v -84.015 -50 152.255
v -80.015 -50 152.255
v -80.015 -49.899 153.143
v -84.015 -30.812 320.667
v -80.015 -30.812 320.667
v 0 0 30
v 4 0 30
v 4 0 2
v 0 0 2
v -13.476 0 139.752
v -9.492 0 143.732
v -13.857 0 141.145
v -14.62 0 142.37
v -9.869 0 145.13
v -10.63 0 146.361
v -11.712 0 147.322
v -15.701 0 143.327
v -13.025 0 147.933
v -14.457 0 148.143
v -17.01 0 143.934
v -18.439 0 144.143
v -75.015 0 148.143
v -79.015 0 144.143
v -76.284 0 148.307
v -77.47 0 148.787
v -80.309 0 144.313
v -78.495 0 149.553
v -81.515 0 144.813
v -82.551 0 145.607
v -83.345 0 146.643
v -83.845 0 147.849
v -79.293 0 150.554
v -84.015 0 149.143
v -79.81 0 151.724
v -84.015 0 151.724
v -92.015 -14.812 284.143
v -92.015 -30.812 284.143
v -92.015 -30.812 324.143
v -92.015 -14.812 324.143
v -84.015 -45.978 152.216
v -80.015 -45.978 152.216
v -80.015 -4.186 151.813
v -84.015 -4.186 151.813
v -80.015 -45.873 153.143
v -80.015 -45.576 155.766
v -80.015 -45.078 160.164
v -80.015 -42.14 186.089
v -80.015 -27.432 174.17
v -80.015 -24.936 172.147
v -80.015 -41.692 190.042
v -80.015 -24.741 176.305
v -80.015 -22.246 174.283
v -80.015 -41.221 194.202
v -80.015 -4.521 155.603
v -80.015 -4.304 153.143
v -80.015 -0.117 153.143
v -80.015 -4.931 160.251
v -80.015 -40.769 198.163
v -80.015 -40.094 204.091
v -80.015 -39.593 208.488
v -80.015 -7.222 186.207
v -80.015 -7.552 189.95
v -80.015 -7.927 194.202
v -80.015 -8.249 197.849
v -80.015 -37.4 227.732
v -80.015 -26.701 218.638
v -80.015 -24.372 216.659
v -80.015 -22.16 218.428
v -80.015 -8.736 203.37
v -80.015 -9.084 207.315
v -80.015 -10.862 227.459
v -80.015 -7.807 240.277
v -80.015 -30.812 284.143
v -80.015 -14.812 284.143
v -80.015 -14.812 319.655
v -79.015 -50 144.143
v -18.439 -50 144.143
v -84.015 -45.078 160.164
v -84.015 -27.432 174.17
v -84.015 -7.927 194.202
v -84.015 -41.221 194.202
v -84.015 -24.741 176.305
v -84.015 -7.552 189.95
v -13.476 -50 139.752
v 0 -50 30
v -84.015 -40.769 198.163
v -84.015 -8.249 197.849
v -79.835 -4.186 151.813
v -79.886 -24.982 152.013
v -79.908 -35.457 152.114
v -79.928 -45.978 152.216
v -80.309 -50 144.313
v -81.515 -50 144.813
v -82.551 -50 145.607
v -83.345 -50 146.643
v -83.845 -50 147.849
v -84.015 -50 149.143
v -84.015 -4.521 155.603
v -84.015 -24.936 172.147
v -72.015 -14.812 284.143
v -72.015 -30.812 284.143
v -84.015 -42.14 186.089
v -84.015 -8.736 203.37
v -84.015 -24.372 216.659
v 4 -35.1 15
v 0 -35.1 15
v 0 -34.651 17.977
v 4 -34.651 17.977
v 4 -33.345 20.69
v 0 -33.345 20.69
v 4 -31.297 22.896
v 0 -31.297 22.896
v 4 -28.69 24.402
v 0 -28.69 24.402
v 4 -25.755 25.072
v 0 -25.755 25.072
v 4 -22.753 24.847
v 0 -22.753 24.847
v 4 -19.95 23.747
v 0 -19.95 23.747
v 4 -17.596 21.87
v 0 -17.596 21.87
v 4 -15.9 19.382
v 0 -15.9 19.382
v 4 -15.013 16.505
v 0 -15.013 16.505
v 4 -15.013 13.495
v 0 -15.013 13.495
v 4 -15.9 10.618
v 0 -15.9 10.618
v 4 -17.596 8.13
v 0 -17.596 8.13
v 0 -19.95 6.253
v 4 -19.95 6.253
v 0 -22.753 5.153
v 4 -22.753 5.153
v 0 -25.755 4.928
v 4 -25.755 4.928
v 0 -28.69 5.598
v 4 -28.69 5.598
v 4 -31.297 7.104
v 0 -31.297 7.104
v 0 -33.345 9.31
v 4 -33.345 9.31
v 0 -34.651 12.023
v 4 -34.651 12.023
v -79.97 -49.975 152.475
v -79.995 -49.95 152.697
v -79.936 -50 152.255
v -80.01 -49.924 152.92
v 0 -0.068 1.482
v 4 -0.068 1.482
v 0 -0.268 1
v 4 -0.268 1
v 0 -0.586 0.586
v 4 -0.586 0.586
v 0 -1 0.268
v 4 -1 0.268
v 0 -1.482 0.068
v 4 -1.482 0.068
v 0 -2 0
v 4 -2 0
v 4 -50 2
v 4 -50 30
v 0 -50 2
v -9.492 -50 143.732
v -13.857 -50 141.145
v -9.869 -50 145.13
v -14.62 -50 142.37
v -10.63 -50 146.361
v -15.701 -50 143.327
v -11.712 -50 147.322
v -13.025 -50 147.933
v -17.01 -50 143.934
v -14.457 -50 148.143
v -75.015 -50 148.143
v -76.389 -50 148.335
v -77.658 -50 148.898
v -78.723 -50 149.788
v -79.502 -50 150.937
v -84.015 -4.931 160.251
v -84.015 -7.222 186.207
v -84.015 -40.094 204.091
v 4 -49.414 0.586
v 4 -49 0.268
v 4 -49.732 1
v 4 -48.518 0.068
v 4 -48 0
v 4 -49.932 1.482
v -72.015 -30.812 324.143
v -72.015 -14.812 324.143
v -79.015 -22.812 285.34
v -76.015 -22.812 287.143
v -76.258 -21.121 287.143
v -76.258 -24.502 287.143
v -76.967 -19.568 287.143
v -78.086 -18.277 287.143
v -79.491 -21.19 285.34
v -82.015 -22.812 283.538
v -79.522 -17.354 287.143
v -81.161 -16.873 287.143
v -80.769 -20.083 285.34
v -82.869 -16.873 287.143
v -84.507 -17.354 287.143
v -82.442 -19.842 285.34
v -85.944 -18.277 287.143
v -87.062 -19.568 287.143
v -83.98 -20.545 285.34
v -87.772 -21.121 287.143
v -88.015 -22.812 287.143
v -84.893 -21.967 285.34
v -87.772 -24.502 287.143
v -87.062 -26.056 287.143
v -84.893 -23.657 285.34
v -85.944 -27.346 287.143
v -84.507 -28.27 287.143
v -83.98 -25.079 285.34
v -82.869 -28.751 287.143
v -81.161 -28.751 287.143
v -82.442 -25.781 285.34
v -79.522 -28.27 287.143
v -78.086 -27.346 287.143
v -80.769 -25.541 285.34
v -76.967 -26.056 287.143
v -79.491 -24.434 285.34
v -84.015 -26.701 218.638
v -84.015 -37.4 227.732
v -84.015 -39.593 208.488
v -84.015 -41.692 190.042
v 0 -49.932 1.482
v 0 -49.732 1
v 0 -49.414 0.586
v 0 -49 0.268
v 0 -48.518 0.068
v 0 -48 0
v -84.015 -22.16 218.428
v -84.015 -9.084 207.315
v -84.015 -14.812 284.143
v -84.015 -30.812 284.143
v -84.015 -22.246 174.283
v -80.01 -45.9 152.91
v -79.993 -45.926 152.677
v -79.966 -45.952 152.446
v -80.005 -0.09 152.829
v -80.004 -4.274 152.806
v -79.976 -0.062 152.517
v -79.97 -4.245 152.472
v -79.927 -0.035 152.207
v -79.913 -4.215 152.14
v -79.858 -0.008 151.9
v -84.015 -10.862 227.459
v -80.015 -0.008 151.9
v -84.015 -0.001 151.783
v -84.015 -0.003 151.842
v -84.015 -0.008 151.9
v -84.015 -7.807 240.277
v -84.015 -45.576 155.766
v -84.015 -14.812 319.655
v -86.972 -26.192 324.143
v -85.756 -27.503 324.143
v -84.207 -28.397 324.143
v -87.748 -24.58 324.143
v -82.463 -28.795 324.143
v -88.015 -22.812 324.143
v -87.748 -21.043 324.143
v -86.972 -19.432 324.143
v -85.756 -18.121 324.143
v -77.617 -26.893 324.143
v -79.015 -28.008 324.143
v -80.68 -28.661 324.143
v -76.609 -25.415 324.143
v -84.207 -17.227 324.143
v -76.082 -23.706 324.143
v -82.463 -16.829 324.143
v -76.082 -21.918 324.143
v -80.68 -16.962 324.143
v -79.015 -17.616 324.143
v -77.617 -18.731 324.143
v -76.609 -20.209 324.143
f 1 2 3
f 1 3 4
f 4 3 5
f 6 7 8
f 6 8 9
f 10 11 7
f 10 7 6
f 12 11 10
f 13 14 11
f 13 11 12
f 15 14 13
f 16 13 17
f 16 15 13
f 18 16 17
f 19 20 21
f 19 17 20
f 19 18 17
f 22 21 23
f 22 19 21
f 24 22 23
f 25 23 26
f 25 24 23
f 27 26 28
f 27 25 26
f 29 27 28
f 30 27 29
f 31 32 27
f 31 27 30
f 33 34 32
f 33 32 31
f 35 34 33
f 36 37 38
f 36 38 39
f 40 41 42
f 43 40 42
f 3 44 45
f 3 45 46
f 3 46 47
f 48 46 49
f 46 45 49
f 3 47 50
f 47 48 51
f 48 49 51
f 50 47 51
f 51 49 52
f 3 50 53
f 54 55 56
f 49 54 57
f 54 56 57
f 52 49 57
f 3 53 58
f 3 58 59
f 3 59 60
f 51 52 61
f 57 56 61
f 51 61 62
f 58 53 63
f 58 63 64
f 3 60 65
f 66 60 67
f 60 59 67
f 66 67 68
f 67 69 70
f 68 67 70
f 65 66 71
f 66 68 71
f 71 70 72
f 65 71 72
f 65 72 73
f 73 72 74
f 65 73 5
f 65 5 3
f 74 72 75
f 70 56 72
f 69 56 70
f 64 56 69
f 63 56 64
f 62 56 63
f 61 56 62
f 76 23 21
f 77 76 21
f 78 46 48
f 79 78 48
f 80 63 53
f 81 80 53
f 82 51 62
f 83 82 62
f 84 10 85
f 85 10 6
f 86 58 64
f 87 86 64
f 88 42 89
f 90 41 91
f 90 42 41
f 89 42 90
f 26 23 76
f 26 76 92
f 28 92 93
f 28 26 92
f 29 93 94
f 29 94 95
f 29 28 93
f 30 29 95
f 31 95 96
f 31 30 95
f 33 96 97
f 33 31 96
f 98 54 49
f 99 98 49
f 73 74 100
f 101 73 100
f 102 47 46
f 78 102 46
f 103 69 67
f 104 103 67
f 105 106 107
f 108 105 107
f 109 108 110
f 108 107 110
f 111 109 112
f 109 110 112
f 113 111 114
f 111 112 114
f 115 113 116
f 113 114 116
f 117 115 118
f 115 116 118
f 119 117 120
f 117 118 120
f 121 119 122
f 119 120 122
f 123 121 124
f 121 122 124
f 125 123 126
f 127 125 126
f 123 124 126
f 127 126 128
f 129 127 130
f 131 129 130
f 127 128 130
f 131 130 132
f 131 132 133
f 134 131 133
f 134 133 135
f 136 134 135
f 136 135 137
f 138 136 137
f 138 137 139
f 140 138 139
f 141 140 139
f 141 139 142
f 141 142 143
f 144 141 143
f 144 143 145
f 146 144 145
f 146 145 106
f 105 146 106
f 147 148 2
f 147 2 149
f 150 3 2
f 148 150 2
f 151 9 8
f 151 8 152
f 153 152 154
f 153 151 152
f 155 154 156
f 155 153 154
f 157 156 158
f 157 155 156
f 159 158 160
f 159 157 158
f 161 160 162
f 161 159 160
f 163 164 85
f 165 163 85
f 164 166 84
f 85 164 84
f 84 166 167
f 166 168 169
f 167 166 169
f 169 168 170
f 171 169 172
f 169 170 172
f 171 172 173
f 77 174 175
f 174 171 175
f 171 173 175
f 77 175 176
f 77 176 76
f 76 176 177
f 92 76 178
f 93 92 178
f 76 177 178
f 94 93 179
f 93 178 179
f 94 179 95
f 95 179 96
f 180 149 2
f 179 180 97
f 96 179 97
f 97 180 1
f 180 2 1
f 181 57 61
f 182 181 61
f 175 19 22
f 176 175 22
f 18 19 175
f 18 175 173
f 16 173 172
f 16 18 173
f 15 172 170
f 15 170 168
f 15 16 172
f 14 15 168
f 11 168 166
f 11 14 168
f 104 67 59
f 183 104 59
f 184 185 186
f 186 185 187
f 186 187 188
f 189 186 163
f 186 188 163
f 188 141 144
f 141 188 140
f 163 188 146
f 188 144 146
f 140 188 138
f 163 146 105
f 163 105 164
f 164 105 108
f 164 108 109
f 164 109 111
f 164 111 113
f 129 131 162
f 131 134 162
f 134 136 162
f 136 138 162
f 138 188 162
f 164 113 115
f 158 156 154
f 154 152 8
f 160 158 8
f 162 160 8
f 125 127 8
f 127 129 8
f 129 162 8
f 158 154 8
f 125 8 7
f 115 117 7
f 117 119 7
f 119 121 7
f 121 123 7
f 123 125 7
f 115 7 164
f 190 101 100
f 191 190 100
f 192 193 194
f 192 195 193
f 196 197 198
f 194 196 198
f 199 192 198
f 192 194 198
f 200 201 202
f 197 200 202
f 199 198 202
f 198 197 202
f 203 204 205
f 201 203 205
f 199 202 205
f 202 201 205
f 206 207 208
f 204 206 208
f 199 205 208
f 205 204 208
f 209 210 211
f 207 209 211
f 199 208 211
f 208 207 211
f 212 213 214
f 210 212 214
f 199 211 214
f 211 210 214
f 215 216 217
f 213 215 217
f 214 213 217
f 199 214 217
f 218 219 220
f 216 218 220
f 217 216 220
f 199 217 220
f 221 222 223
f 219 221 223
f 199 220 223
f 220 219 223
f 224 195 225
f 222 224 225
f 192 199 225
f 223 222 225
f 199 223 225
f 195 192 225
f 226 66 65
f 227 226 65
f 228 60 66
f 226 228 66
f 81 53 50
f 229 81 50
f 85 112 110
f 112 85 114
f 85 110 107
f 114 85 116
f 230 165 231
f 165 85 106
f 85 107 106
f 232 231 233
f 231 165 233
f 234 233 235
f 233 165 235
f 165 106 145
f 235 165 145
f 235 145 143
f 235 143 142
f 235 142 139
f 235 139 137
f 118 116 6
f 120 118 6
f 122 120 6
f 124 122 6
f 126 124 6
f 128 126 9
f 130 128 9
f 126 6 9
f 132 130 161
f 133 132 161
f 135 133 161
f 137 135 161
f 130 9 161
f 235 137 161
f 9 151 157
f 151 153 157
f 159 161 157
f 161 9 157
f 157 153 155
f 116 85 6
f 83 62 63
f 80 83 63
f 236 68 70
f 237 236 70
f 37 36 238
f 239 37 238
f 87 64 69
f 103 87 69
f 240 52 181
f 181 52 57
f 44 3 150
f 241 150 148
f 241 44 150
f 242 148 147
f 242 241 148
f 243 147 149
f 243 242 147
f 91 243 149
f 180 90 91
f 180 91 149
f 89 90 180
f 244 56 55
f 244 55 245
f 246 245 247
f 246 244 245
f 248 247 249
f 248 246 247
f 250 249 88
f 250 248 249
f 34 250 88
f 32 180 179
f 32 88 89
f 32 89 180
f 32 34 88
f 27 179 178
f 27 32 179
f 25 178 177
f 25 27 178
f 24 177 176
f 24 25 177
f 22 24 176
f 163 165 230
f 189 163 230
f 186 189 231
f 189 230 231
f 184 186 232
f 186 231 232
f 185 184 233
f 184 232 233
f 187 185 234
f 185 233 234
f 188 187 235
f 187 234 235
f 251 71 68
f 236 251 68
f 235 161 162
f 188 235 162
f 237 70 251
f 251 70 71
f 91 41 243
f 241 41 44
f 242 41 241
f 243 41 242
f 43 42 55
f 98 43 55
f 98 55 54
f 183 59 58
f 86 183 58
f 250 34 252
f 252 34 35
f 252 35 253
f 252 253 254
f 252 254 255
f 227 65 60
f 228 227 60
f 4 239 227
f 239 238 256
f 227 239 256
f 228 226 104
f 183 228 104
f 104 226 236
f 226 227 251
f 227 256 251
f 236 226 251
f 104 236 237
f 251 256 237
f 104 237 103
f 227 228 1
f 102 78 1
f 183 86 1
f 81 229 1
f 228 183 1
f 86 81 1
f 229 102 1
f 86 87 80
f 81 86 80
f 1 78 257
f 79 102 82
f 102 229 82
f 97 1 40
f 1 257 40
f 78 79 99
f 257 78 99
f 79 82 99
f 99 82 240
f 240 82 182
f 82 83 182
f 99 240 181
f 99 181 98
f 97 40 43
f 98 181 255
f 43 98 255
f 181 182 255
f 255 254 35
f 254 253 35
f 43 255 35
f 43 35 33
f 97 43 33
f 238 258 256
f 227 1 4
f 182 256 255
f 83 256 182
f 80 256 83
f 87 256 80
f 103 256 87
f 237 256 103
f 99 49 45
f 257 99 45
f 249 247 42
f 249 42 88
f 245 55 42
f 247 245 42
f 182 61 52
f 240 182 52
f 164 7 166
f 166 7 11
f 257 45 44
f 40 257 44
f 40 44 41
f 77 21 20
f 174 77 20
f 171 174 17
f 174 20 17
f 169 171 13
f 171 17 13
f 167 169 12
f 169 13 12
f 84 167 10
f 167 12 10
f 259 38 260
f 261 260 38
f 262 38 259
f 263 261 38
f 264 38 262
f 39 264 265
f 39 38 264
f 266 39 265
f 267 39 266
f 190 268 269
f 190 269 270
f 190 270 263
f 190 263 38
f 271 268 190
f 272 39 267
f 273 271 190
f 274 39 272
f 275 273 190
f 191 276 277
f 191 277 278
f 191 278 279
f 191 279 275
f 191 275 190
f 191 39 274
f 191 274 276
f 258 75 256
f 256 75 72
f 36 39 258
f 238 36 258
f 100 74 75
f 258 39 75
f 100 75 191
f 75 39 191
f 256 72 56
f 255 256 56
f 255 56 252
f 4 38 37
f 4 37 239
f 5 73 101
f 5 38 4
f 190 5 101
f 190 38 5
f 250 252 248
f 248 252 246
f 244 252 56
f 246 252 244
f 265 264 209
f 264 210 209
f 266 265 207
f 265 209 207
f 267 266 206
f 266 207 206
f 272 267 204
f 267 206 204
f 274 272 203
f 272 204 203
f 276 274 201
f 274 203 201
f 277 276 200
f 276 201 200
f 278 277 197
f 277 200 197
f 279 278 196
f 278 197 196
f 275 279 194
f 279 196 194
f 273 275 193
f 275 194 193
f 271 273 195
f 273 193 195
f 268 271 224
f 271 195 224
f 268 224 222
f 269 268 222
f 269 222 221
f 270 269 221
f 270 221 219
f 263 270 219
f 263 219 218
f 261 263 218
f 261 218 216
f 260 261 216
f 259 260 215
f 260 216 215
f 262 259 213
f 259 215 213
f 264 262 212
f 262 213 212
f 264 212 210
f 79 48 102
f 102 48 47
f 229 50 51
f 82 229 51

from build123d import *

# Parameters (mm, degrees)
F1_DEPTH     = 50
F3_D         = 20.2
F5_DEPTH     = 25
F6_T1_DEPTH  = 50
F6_T6_DEPTH  = 50
F6_T13_DEPTH = 50
F6_T19_DEPTH = 50
F6_T26_DEPTH = 50
F6_T33_DEPTH = 50
F6_T36_DEPTH = 72.2096061325
F6_T38_DEPTH = 75
F7_T1_DEPTH  = 4.6205948456
F7_T3_DEPTH  = 14
F8_W         = 20
F8_H         = 16
F8_W_2       = 4
F8_H_2       = 15.2079220091
F9_DEPTH     = 40
F10_D        = 12
F10_DEPTH    = 37
F10_TIP      = 3.6051637142


# Not quite as in the source:
# - a fillet or chamfer that OpenCascade refuses, or shapes differently, is made with other operations: its cross-section is extruded or revolved along the edge and cut away or added
# - a feature names something its author has since deleted; it is built from what else it names


with BuildPart() as f1:
    # F0 (on Front) → F1 (new body)
    with BuildSketch(Plane.XZ):
        Polygon((0, 30), (0, 0), (4, 0), (4, 30), (-10.0149744916, 148.1428074388), (-14.0149744916, 148.1428074388), (-80.0149744916, 148.1428074388), (-80.0149744916, 324.1428074388), (-84.0149744916, 324.1428074388), (-84.0149744916, 144.1428074388), (-14.0149744916, 144.1428074388), align=None)
    extrude(amount=F1_DEPTH)

    # F3 (through all)
    with Locations(Plane.YZ.offset(4)):
        with Locations((-25, 15)):
            Hole(F3_D / 2)

    # F4 (on face) → F5 (cut)
    with BuildSketch(Plane.YZ.offset(-80.0149744916)):
        Polygon((-50, 324.1428074388), (-50, 236.1428074388), (-50, 199.9447409799), (-50, 195.9447409799), (-50, 194.2019151126), (-50, 156.2548764067), (-50, 152.2548764067), (-39.9857666554, 240.1486744376), (-30.4158440182, 324.1428074388), align=None)
        Polygon((0, 324.1428074388), (-15.2079220091, 324.1428074388), (-7.806897337, 240.2772722232), (0, 151.8125457081), (0, 244.1428074388), align=None)
        Polygon((-45.5760135212, 155.7661052017), (-45.9782811199, 152.2160466314), (-4.1864533227, 151.8125457081), (-4.5209163536, 155.6025507861), (-24.936375975, 172.1473690272), align=None)
        Polygon((-9.0844288508, 207.3145008204), (-10.8621816933, 227.4593051175), (-22.1599204596, 218.427607474), align=None)
        Polygon((-42.1400031958, 186.0892978758), (-45.0776405527, 160.1643048917), (-27.431660318, 174.1695633191), align=None)
        Polygon((-39.5929888388, 208.4884916623), (-26.7007793174, 218.6382363502), (-37.4004572752, 227.7320942228), align=None)
        Polygon((-22.2456820263, 174.2829185178), (-4.9311455022, 160.2511080648), (-7.2217303873, 186.2071257598), align=None)
        Polygon((-8.7363235607, 203.3699069618), (-24.3721529686, 216.6590929463), (-40.0940653957, 204.0905991656), (-40.7694266569, 198.1630294508), (-8.2490940623, 197.8488116452), align=None)
        Polygon((-41.6920664445, 190.0423920546), (-24.7411634004, 176.305272485), (-7.5520306119, 189.9499595352), (-7.9272601749, 194.2019151126), (-41.2207386286, 194.2019151126), align=None)
    extrude(amount=-F5_DEPTH, mode=Mode.SUBTRACT)

    # F6: fillet of radius 5 on 4 edges, made by hand

    # F6_s2 → F6_t1 (join)
    with BuildSketch(Plane.XZ):
        with BuildLine():
            ThreePointArc((-18.4386008144, 144.1428074388), (-15.1255005733, 142.8875860427), (-13.4758700562, 139.7521541558))
            Line((-13.4758700562, 139.7521541558), (-14.0149744916, 144.1428074388))
            Line((-14.0149744916, 144.1428074388), (-18.4386008144, 144.1428074388))
        make_face()
    extrude(amount=F6_T1_DEPTH)


with BuildPart() as f6_tool4:
    # F6_s5 → F6_t6 (new body)
    with BuildSketch(Plane.XZ):
        with BuildLine():
            ThreePointArc((-80.0149744916, 153.1428074388), (-78.5505083975, 149.6072735328), (-75.0149744916, 148.1428074388))
            Line((-75.0149744916, 148.1428074388), (-80.0149744916, 148.1428074388))
            Line((-80.0149744916, 148.1428074388), (-80.0149744916, 153.1428074388))
        make_face()
    extrude(amount=F6_T6_DEPTH)

    split(bisect_by=Plane(origin=(0, 13.2937308283, 1.1731544977), x_dir=(1, 0, 0), z_dir=(0, -0.9961286805, -0.0879070636)), keep=Keep.TOP)

    split(bisect_by=Plane(origin=(0, 1.465226283, 151.7579786298), x_dir=(1, 0, 0), z_dir=(0, 0.0096545698, 0.9999533936)), keep=Keep.TOP)

    split(bisect_by=Plane(origin=(0, 9.1396289593, 0.8065603975), x_dir=(1, 0, 0), z_dir=(0, 0.9961286805, 0.0879070636)), keep=Keep.TOP)


with BuildPart() as f1_1:
    add(f1.part)

    # F6_t3: union F6_tool4
    add(f6_tool4.part)


with BuildPart() as f6_tool11:
    # F6_s12 → F6_t13 (new body)
    with BuildSketch(Plane.XZ):
        with BuildLine():
            ThreePointArc((-80.0149744916, 153.1428074388), (-78.5505083975, 149.6072735328), (-75.0149744916, 148.1428074388))
            Line((-75.0149744916, 148.1428074388), (-80.0149744916, 148.1428074388))
            Line((-80.0149744916, 148.1428074388), (-80.0149744916, 153.1428074388))
        make_face()
    extrude(amount=F6_T13_DEPTH)

    split(bisect_by=Plane(origin=(0, 1.465226283, 151.7579786298), x_dir=(1, 0, 0), z_dir=(0, -0.0096545698, -0.9999533936)), keep=Keep.TOP)

    split(bisect_by=Plane(origin=(0, 9.1396289593, 0.8065603975), x_dir=(1, 0, 0), z_dir=(0, 0.9961286805, 0.0879070636)), keep=Keep.TOP)


with BuildPart() as f1_2:
    add(f1_1.part)

    # F6_t10: union F6_tool11
    add(f6_tool11.part)


with BuildPart() as f6_tool17:
    # F6_s18 → F6_t19 (new body)
    with BuildSketch(Plane.XZ):
        with BuildLine():
            ThreePointArc((-80.0149744916, 153.1428074388), (-78.5505083975, 149.6072735328), (-75.0149744916, 148.1428074388))
            Line((-75.0149744916, 148.1428074388), (-80.0149744916, 148.1428074388))
            Line((-80.0149744916, 148.1428074388), (-80.0149744916, 153.1428074388))
        make_face()
    extrude(amount=F6_T19_DEPTH)

    split(bisect_by=Plane(origin=(0, -62.4248064238, 7.0735387838), x_dir=(1, 0, 0), z_dir=(0, 0.9936412568, -0.1125924191)), keep=Keep.TOP)

    split(bisect_by=Plane(origin=(0, 1.465226283, 151.7579786298), x_dir=(1, 0, 0), z_dir=(0, -0.0096545698, -0.9999533936)), keep=Keep.TOP)

    split(bisect_by=Plane(origin=(0, 9.1396289593, 0.8065603975), x_dir=(1, 0, 0), z_dir=(0, -0.9961286805, -0.0879070636)), keep=Keep.TOP)


with BuildPart() as f1_3:
    add(f1_2.part)

    # F6_t16: union F6_tool17
    add(f6_tool17.part)


with BuildPart() as f6_tool24:
    # F6_s25 → F6_t26 (new body)
    with BuildSketch(Plane.XZ):
        with BuildLine():
            ThreePointArc((-80.0149744916, 153.1428074388), (-78.5505083975, 149.6072735328), (-75.0149744916, 148.1428074388))
            Line((-75.0149744916, 148.1428074388), (-80.0149744916, 148.1428074388))
            Line((-80.0149744916, 148.1428074388), (-80.0149744916, 153.1428074388))
        make_face()
    extrude(amount=F6_T26_DEPTH)

    split(bisect_by=Plane(origin=(0, -66.484199108, 7.5749176678), x_dir=(1, 0, 0), z_dir=(0, 0.9935718557, -0.1132032138)), keep=Keep.TOP)

    split(bisect_by=Plane(origin=(0, -62.4248064238, 7.0735387838), x_dir=(1, 0, 0), z_dir=(0, -0.9936412568, 0.1125924191)), keep=Keep.TOP)

    split(bisect_by=Plane(origin=(0, 1.465226283, 151.7579786298), x_dir=(1, 0, 0), z_dir=(0, 0.0096545698, 0.9999533936)), keep=Keep.TOP)


with BuildPart() as f1_4:
    add(f1_3.part)

    # F6_t23: union F6_tool24
    add(f6_tool24.part)


with BuildPart() as f6_tool31:
    # F6_s32 → F6_t33 (new body)
    with BuildSketch(Plane.XZ):
        with BuildLine():
            ThreePointArc((-80.0149744916, 153.1428074388), (-78.5505083975, 149.6072735328), (-75.0149744916, 148.1428074388))
            Line((-75.0149744916, 148.1428074388), (-80.0149744916, 148.1428074388))
            Line((-80.0149744916, 148.1428074388), (-80.0149744916, 153.1428074388))
        make_face()
    extrude(amount=F6_T33_DEPTH)

    split(bisect_by=Plane(origin=(0, -62.4248064238, 7.0735387838), x_dir=(1, 0, 0), z_dir=(0, -0.9936412568, 0.1125924191)), keep=Keep.TOP)

    split(bisect_by=Plane(origin=(0, 1.465226283, 151.7579786298), x_dir=(1, 0, 0), z_dir=(0, -0.0096545698, -0.9999533936)), keep=Keep.TOP)


with BuildPart() as f1_5:
    add(f1_4.part)

    # F6_t30: union F6_tool31
    add(f6_tool31.part)

    # F6_s37 → F6_t36 (cut)
    with BuildSketch(Plane.XZ.offset(-11.1048030662)):
        with BuildLine():
            ThreePointArc((-14.4568957181, 148.1428074388), (-11.1361304097, 146.8807905536), (-9.4917098577, 143.7318145454))
            Line((-9.4917098577, 143.7318145454), (-10.0149744916, 148.1428074388))
            Line((-10.0149744916, 148.1428074388), (-14.4568957181, 148.1428074388))
        make_face()
    extrude(amount=F6_T36_DEPTH, mode=Mode.SUBTRACT)

    # F6_s39 → F6_t38 (cut)
    with BuildSketch(Plane.XZ.offset(-12.5)):
        with BuildLine():
            ThreePointArc((-79.0149744916, 144.1428074388), (-82.5505083975, 145.6072735328), (-84.0149744916, 149.1428074388))
            Line((-84.0149744916, 149.1428074388), (-84.0149744916, 144.1428074388))
            Line((-84.0149744916, 144.1428074388), (-79.0149744916, 144.1428074388))
        make_face()
    extrude(amount=F6_T38_DEPTH, mode=Mode.SUBTRACT)

    # F7: fillet of radius 2 on 3 edges, made by hand

    # F7_s2 → F7_t1 (cut)
    with BuildSketch(Plane.YZ.offset(-84.2351683711)):
        with BuildLine():
            ThreePointArc((0, 151.7244681563), (-0.0019365973, 151.8124604227), (-0.007742639, 151.9002822835))
            Line((-0.007742639, 151.9002822835), (0, 151.8125457081))
            Line((0, 151.8125457081), (0, 151.7244681563))
        make_face()
    extrude(amount=F7_T1_DEPTH, mode=Mode.SUBTRACT)

    # F7_s4 → F7_t3 (cut)
    with BuildSketch(Plane.YZ.offset(-5)):
        with BuildLine():
            ThreePointArc((-50, 2), (-49.4142135624, 0.5857864376), (-48, 0))
            Line((-48, 0), (-50, 0))
            Line((-50, 0), (-50, 2))
        make_face()
        with BuildLine():
            ThreePointArc((0, 2), (-0.5857864376, 0.5857864376), (-2, 0))
            Line((-2, 0), (0, 0))
            Line((0, 0), (0, 2))
        make_face()
    extrude(amount=F7_T3_DEPTH, mode=Mode.SUBTRACT)

    # F8 (on face) → F9 (join)
    with BuildSketch(Plane.XY.offset(324.1428074388)):
        with Locations((-82.0149744916, -22.8118830136)):
            Rectangle(F8_W, F8_H)
        with Locations((-82.0149744916, -22.8118830136)):
            Rectangle(F8_W_2, F8_H_2, mode=Mode.SUBTRACT)
    extrude(amount=-F9_DEPTH)

    # F10
    with Locations(Plane.XY.offset(324.1428074388)):
        with Locations((-82.0149744916, -22.8118830136)):
            Hole(F10_D / 2, depth=F10_DEPTH)
            with Locations((0, 0, -(F10_DEPTH + F10_TIP / 2))):  # 118° drill point
                Cone(0, F10_D / 2, F10_TIP, mode=Mode.SUBTRACT)


solid = f1_5.part
